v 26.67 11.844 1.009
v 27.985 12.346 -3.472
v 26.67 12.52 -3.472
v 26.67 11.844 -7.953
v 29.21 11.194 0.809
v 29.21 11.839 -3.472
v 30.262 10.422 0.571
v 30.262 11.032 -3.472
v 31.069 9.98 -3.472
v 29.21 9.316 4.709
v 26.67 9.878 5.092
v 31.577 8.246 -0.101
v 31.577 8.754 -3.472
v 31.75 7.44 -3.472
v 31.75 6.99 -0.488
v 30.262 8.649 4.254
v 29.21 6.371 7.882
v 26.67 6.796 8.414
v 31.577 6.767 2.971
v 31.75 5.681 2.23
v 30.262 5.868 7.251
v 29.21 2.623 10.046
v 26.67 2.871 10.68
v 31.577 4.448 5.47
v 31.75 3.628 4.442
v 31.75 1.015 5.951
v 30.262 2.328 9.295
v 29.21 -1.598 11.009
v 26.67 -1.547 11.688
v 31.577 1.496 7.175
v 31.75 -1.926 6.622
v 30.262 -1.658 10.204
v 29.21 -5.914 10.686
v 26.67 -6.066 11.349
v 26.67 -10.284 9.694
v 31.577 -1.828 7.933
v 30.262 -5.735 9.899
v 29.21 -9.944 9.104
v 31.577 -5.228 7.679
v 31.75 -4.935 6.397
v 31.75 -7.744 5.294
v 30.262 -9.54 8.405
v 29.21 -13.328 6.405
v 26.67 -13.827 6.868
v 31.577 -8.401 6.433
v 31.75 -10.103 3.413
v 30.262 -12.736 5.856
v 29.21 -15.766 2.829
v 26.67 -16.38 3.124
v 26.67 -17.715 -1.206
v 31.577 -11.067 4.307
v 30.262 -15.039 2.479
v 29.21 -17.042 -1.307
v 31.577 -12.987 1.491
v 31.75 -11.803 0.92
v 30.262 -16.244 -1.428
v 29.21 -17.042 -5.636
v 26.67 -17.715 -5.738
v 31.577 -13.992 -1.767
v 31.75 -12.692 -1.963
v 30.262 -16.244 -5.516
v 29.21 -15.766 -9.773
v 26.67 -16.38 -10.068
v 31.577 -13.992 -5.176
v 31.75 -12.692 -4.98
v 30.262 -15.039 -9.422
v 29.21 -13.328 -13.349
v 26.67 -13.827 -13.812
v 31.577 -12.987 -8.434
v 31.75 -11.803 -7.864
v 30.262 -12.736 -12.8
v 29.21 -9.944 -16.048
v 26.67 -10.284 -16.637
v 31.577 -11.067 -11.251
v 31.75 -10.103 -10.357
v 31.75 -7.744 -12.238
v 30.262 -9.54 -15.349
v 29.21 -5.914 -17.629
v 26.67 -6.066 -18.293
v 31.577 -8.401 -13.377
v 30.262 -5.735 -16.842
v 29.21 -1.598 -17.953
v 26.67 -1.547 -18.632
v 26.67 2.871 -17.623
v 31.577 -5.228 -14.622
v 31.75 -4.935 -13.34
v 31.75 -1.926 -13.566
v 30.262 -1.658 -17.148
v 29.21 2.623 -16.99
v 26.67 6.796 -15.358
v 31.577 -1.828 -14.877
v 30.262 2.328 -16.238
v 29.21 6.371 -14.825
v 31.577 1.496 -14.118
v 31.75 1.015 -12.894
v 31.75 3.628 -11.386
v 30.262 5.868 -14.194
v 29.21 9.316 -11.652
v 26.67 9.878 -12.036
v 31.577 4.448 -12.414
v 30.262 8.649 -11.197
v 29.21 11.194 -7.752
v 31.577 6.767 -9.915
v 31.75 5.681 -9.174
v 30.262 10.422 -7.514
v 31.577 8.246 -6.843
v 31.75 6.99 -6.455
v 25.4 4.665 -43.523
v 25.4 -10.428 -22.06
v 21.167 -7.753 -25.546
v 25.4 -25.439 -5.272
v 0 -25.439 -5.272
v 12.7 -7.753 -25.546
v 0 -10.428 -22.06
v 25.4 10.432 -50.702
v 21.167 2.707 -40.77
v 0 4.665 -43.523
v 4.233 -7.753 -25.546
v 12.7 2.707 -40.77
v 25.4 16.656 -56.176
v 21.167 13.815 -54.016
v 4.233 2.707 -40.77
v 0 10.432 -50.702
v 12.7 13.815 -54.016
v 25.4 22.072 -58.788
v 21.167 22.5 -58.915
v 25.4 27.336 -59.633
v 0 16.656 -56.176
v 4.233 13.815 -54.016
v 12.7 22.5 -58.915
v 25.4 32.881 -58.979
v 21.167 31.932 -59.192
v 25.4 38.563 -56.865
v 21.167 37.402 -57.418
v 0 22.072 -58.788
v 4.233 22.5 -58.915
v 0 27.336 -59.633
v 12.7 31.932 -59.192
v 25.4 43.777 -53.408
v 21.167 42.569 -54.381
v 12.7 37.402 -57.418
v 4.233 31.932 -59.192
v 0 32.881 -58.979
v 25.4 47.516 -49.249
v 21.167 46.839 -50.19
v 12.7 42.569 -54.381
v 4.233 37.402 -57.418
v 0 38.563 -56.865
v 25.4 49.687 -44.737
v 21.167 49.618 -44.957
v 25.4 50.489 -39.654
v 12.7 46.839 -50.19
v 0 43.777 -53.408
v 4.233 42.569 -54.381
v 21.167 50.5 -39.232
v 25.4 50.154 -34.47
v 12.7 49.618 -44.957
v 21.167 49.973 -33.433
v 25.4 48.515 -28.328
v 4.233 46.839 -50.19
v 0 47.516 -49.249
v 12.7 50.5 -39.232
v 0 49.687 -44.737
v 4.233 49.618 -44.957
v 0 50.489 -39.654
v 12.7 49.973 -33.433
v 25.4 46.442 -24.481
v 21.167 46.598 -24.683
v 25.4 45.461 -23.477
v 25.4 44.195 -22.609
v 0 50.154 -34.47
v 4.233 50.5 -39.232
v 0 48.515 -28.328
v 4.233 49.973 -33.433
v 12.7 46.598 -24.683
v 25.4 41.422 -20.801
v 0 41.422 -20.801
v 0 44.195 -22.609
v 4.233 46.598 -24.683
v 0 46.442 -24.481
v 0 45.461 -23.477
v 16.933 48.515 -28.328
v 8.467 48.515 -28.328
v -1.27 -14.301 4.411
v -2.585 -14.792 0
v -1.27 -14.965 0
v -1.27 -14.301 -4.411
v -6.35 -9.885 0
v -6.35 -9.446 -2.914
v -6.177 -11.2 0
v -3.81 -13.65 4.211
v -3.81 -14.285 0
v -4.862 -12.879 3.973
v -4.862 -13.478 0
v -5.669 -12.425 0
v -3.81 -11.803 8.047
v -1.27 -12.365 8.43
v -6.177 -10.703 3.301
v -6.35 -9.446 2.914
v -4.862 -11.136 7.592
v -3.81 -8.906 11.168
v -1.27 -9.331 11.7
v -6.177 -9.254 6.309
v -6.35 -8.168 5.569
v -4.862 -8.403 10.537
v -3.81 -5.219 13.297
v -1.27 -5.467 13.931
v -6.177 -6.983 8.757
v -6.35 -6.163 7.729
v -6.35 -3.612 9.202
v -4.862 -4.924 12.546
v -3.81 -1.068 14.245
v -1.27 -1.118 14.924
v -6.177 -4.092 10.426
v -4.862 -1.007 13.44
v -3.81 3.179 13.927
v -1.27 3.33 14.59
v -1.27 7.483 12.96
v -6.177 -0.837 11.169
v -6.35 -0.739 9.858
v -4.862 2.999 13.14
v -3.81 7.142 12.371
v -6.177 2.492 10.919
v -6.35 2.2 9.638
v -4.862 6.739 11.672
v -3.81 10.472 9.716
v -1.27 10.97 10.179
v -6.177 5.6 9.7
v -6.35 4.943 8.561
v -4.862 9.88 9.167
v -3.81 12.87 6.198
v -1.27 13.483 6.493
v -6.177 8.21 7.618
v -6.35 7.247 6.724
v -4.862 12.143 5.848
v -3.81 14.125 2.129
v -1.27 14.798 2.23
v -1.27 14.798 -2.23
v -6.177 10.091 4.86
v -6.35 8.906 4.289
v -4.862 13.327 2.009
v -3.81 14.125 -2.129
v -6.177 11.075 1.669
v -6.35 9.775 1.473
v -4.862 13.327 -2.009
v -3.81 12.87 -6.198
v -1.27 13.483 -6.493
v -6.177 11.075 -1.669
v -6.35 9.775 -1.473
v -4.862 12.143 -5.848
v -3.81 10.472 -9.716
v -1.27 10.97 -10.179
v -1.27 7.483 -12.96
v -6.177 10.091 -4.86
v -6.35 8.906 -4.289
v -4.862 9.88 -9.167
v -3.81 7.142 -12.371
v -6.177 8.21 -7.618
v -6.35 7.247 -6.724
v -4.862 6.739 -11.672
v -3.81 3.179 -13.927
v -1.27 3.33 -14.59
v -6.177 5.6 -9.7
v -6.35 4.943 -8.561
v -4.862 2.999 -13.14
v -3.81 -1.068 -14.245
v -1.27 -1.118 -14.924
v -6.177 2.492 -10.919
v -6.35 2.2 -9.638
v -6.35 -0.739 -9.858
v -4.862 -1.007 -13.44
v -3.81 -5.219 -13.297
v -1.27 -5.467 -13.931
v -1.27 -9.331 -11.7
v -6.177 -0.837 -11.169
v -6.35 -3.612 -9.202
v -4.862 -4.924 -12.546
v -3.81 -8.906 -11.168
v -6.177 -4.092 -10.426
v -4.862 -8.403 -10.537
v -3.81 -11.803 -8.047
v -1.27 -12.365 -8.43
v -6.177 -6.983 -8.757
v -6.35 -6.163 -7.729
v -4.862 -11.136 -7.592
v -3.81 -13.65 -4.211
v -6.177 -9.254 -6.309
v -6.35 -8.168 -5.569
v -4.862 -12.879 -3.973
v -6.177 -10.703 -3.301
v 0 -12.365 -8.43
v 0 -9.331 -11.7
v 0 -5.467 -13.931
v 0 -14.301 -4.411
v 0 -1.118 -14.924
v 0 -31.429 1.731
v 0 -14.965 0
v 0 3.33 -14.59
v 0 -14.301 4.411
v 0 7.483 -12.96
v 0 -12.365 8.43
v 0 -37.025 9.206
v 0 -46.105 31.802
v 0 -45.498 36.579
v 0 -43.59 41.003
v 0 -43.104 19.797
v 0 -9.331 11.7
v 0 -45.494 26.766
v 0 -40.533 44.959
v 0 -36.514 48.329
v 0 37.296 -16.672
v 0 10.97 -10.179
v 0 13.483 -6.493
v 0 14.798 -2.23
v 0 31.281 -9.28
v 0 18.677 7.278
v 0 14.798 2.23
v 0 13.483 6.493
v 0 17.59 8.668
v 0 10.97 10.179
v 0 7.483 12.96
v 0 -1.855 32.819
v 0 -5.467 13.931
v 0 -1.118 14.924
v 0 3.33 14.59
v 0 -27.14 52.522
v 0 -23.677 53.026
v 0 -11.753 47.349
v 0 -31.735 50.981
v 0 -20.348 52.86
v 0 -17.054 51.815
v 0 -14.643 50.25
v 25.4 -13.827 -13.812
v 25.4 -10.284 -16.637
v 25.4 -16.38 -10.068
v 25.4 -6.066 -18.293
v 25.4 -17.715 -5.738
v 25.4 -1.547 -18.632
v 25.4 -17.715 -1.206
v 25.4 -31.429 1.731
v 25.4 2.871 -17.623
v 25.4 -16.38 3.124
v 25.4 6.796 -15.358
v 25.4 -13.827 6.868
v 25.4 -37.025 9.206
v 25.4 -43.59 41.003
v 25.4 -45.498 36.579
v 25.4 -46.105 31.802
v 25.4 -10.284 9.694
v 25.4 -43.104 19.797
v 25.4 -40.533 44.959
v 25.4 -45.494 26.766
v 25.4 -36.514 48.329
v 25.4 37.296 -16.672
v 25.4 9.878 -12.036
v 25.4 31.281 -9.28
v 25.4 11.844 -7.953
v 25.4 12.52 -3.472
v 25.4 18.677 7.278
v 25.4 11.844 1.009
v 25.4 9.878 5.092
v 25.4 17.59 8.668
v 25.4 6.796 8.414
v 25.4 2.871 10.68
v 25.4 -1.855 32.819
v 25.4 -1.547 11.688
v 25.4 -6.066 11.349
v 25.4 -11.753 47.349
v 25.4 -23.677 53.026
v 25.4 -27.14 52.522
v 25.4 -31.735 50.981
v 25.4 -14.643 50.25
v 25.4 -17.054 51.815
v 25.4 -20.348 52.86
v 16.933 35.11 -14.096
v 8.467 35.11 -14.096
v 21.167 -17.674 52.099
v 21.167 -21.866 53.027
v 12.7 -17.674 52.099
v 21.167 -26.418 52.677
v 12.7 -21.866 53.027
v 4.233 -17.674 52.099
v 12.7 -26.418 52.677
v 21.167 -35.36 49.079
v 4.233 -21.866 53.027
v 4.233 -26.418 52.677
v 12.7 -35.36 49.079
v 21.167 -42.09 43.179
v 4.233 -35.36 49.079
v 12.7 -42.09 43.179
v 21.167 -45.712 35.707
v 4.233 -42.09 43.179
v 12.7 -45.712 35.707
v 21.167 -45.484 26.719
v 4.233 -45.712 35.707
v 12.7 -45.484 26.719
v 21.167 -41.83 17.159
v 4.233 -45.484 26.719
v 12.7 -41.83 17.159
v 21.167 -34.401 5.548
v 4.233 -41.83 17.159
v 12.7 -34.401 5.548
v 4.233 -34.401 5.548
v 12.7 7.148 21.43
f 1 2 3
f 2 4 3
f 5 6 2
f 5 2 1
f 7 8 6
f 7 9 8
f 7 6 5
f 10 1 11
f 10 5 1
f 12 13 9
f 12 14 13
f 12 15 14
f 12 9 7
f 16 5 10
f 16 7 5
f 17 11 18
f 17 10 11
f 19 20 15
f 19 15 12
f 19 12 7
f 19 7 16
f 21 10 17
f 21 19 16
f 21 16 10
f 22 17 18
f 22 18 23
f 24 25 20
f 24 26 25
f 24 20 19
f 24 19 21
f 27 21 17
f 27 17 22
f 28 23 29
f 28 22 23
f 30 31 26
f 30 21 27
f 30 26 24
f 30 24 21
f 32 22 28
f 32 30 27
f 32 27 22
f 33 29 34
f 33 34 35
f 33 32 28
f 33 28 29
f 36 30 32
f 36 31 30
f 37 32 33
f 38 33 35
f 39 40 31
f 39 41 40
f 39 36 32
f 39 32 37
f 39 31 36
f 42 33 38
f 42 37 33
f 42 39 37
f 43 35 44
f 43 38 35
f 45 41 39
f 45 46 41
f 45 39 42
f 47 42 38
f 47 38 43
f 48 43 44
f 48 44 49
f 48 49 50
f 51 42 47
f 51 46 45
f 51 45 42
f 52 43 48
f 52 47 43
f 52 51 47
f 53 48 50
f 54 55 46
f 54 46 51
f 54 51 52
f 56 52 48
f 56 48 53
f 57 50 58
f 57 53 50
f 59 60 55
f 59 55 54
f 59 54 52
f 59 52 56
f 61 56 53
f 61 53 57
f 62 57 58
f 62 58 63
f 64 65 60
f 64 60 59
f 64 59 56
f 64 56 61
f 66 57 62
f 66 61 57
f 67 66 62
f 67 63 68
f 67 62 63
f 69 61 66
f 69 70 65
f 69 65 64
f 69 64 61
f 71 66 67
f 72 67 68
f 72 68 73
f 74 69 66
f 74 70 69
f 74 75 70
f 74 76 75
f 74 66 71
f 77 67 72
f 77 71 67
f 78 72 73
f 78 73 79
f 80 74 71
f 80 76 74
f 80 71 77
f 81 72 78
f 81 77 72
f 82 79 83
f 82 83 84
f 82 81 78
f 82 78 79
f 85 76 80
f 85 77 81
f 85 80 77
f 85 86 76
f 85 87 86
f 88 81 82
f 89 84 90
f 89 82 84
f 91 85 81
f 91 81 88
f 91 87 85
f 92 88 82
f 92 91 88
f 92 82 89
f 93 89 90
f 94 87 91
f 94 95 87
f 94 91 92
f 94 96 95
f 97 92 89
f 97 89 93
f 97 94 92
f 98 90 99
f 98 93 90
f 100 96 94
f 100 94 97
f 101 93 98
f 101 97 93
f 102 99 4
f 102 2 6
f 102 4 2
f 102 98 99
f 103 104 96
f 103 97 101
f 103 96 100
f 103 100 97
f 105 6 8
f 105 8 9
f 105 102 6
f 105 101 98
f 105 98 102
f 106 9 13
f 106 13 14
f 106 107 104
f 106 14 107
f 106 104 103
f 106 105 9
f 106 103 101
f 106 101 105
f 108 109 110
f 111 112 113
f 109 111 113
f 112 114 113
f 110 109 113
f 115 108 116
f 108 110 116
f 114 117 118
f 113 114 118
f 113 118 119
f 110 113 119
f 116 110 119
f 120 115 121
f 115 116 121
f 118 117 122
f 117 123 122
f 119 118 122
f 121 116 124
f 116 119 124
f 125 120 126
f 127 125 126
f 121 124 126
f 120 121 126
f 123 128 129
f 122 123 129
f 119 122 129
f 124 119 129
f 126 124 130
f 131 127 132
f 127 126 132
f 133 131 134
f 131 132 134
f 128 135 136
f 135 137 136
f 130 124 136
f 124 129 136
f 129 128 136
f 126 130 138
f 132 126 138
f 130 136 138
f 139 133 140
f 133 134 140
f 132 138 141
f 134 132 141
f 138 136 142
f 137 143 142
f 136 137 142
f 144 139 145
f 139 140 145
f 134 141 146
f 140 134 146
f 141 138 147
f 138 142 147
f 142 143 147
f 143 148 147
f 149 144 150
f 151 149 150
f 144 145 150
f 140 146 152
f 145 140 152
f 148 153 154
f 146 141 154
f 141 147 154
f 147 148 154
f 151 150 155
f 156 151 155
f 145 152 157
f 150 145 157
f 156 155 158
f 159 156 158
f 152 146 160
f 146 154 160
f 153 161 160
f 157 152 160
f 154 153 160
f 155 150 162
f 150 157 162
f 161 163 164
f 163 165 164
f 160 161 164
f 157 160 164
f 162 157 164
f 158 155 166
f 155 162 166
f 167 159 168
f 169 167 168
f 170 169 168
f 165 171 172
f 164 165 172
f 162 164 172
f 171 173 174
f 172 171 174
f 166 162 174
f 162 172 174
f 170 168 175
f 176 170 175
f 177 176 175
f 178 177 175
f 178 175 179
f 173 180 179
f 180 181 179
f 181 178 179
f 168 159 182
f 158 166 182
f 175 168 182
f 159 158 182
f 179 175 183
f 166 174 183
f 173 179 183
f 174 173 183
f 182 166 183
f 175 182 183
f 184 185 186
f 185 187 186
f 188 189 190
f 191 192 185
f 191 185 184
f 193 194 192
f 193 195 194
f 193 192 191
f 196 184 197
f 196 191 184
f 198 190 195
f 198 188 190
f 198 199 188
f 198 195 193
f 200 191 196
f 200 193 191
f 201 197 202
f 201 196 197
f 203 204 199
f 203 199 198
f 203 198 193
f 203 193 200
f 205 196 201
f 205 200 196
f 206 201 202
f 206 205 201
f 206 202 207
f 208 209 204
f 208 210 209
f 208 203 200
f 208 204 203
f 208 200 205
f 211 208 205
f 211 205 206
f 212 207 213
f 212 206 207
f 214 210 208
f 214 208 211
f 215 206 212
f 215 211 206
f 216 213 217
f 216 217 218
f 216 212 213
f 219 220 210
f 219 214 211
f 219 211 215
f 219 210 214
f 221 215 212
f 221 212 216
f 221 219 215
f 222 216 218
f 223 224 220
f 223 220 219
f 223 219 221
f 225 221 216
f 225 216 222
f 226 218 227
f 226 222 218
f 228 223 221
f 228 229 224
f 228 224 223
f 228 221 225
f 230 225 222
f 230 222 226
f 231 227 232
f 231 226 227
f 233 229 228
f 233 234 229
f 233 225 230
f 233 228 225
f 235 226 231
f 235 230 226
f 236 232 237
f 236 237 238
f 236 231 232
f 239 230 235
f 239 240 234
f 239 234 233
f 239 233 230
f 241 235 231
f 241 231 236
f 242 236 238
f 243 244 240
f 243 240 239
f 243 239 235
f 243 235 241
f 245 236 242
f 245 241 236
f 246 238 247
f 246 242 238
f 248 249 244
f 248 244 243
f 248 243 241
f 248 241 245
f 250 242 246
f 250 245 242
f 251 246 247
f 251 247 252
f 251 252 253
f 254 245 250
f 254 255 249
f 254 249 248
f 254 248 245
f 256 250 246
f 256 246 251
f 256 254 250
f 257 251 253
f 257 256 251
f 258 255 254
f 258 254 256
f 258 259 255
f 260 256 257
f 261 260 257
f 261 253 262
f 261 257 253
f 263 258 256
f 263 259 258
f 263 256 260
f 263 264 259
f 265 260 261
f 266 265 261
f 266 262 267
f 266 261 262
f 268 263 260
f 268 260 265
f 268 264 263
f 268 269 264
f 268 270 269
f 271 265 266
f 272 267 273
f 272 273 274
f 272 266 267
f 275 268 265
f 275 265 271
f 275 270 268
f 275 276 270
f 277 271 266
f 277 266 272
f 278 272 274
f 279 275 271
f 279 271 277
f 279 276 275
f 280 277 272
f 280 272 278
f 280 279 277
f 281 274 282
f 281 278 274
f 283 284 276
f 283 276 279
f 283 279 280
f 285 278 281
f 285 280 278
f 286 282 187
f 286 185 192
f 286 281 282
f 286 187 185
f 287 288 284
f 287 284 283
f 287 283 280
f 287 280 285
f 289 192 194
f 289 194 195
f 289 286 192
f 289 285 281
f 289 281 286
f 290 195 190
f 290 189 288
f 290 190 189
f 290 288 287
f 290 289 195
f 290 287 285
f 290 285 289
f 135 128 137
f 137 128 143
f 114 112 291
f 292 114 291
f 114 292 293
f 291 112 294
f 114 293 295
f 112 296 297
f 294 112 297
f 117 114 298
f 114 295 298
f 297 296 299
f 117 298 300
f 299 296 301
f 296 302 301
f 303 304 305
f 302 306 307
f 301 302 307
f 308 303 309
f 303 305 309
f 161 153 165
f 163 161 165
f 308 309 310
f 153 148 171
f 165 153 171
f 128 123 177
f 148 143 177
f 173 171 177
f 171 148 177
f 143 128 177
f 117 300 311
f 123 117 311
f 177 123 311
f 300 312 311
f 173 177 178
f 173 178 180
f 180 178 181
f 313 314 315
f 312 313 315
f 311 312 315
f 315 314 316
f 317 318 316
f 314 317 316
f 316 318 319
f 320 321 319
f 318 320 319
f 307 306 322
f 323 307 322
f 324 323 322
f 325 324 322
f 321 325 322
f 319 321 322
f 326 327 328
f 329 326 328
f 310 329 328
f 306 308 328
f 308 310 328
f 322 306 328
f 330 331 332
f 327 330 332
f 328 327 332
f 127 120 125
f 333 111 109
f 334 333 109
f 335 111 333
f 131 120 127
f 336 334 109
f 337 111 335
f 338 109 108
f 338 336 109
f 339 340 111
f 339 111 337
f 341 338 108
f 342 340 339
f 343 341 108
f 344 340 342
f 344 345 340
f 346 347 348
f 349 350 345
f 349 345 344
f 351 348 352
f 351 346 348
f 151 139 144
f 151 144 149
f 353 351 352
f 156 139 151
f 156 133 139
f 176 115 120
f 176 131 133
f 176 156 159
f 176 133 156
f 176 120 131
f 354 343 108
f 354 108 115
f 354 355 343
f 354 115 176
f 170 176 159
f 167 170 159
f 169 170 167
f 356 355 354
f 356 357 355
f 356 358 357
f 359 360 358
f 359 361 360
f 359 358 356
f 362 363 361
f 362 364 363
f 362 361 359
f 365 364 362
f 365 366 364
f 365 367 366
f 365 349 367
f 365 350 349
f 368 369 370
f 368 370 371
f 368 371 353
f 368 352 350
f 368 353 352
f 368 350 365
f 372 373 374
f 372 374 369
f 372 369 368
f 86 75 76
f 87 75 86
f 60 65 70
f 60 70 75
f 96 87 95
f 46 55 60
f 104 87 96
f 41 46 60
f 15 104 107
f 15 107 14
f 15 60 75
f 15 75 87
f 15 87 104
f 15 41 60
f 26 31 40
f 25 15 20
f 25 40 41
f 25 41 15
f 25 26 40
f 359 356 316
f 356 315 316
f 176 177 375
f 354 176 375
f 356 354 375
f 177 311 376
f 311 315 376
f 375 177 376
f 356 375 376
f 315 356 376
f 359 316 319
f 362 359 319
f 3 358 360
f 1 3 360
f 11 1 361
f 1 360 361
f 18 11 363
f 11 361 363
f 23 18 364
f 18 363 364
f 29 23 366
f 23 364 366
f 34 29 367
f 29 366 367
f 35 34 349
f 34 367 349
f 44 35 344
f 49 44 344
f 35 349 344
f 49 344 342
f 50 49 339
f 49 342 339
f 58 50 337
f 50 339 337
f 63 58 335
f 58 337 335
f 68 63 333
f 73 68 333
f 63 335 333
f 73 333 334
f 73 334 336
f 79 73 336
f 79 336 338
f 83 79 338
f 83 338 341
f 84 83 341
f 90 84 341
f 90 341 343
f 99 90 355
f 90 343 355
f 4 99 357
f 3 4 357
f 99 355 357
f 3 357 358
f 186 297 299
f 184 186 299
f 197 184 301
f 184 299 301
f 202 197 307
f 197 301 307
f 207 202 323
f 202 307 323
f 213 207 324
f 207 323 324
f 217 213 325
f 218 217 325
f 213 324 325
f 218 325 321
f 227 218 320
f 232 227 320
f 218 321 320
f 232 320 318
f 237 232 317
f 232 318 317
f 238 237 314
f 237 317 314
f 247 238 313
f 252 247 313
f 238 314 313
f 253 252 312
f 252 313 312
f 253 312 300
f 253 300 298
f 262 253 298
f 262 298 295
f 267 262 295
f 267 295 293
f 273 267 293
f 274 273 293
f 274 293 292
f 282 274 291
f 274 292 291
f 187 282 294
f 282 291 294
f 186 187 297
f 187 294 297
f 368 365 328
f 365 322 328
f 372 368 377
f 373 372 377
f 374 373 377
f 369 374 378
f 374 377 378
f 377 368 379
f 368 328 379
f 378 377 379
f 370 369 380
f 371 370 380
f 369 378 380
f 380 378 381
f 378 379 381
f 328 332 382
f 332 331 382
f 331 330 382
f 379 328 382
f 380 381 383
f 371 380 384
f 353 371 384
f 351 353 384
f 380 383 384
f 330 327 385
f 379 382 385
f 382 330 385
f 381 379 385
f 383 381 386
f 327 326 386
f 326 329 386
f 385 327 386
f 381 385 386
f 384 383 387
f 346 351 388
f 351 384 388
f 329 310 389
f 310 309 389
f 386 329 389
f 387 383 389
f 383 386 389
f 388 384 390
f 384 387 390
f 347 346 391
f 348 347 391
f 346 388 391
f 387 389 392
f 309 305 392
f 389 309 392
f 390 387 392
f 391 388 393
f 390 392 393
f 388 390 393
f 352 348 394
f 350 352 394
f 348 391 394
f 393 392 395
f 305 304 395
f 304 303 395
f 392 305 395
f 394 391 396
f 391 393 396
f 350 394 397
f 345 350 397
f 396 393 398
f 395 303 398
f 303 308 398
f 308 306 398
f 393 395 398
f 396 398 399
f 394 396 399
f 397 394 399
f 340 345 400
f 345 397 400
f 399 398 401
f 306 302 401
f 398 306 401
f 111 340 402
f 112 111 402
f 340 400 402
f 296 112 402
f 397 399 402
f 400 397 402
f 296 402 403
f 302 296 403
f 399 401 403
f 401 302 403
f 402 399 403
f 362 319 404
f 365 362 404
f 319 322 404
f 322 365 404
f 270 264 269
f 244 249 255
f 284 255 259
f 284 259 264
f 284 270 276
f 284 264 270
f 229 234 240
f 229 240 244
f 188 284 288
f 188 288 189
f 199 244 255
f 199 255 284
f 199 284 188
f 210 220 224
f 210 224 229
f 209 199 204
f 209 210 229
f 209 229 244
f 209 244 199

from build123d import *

# Parameters (mm, degrees)
F1_DEPTH = 25.4
F2_R     = 15.2023379057
F3_DEPTH = 6.35
F4_R     = 5.08
F5_R     = 14.9654101867
F6_DEPTH = 6.35
F7_R     = 5.08


with BuildPart() as f1:
    # F0 (on Right) → F1 (new body)
    with BuildSketch(Plane.YZ):
        with BuildLine():
            add(Edge.make_bspline(
                [(17.5895973285, 8.6684559332), (12.926883986, 14.595669488), (8.5494174917, 19.6884086013), (4.5840121801, 24.5384006165)],
                knots=[0.0995191246, 0.0995191246, 0.0995191246, 0.0995191246, 0.152721543, 0.152721543, 0.152721543, 0.152721543], degree=3))
            add(Edge.make_bspline(
                [(4.5840121801, 24.5384006165), (-2.6449352498, 24.2912825538), (-16.1555832179, 23.8277360507), (-20.8656688407, 7.9987518659), (-26.1889236954, 0.4550080745), (-25.6655710399, -3.5394503148), (-25.4385583103, -5.2721607499)],
                knots=[0, 0, 0, 0, 0.3250640996, 0.6074597615, 0.8297202417, 1, 1, 1, 1], degree=3))
            add(Edge.make_bspline(
                [(-25.4385583103, -5.2721607499), (-19.4594130533, -11.9211098705), (-7.0275398922, -23.92143448), (11.2285332479, -56.499011327), (31.8657157041, -62.3988290991), (54.7809349484, -47.6982303514), (47.7318843456, -22.8967932655), (43.6377429171, -22.5775247161), (41.4221696556, -20.8011046052)],
                knots=[0.5588461474, 0.5588461474, 0.5588461474, 0.5588461474, 0.6425413931, 0.7389755952, 0.8090175152, 0.8859010502, 0.9589551189, 1, 1, 1, 1], degree=3))
            add(Edge.make_bspline(
                [(41.4221696556, -20.8011046052), (36.2724600651, -16.6721291203), (27.1098664748, -3.5665562843), (18.677022654, 7.2778597007)],
                knots=[0, 0, 0, 0, 0.0954015927, 0.0954015927, 0.0954015927, 0.0954015927], degree=3))
            add(Edge.make_bspline(
                [(18.677022654, 7.2778597007), (20.5479403218, 4.5193017031), (22.7185021169, -2.2242411706), (20.9560532942, -4.5004371737), (20.4507708549, -5.8810990304)],
                knots=[0.855051074, 0.855051074, 0.855051074, 0.855051074, 0.9432583461, 1, 1, 1, 1], degree=3))
            add(Edge.make_bspline(
                [(20.4507708549, -5.8810990304), (19.7334866596, -7.8410462834), (18.9363412125, -14.6456595882), (6.7083467506, -23.7841967524), (-6.5196901774, -21.2806184823), (-14.2159187864, -13.5782446445), (-18.6143428061, -2.5133707137), (-11.6738903391, 8.7514405367), (-3.167673086, 18.2061044328), (10.8069775822, 13.3883321592), (15.9377118907, 10.4988793955), (17.5895973285, 8.6684559332)],
                knots=[0, 0, 0, 0, 0.0805487948, 0.1860104875, 0.2852583123, 0.3766701629, 0.4688855974, 0.5686999528, 0.6641075306, 0.7690941368, 0.8388777749, 0.8388777749, 0.8388777749, 0.8388777749], degree=3))
        make_face()
        with BuildLine():
            add(Edge.make_bspline(
                [(4.5840121801, 24.5384006165), (-2.6449352498, 24.2912825538), (-16.1555832179, 23.8277360507), (-20.8656688407, 7.9987518659), (-26.1889236954, 0.4550080745), (-25.6655710399, -3.5394503148), (-25.4385583103, -5.2721607499)],
                knots=[0, 0, 0, 0, 0.3250640996, 0.6074597615, 0.8297202417, 1, 1, 1, 1], degree=3))
            add(Edge.make_bspline(
                [(4.5840121801, 24.5384006165), (1.495955059, 28.3153291277), (-6.4591174842, 38.4890393217), (-15.2300614855, 56.3009606306), (-36.68626185, 50.668932912), (-48.6411700722, 36.077924192), (-42.9908909127, 15.8445771028), (-31.5144702266, 1.4843951551), (-25.4385583103, -5.2721607499)],
                knots=[0.152721543, 0.152721543, 0.152721543, 0.152721543, 0.1941528958, 0.2688492969, 0.337197153, 0.4035534252, 0.4737963753, 0.5588461474, 0.5588461474, 0.5588461474, 0.5588461474], degree=3))
        make_face()
        with BuildLine():
            add(Edge.make_bspline(
                [(18.677022654, 7.2778597007), (18.3492834329, 7.6993237434), (17.9865460441, 8.1635757898), (17.6255113718, 8.6228022143), (17.5895973285, 8.6684559332)],
                knots=[0.0954015927, 0.0954015927, 0.0954015927, 0.0954015927, 0.0991093388, 0.0995191246, 0.0995191246, 0.0995191246, 0.0995191246], degree=3))
            add(Edge.make_bspline(
                [(20.4507708549, -5.8810990304), (19.7334866596, -7.8410462834), (18.9363412125, -14.6456595882), (6.7083467506, -23.7841967524), (-6.5196901774, -21.2806184823), (-14.2159187864, -13.5782446445), (-18.6143428061, -2.5133707137), (-11.6738903391, 8.7514405367), (-3.167673086, 18.2061044328), (10.8069775822, 13.3883321592), (15.9377118907, 10.4988793955), (17.5895973285, 8.6684559332)],
                knots=[0, 0, 0, 0, 0.0805487948, 0.1860104875, 0.2852583123, 0.3766701629, 0.4688855974, 0.5686999528, 0.6641075306, 0.7690941368, 0.8388777749, 0.8388777749, 0.8388777749, 0.8388777749], degree=3))
            add(Edge.make_bspline(
                [(18.677022654, 7.2778597007), (20.5479403218, 4.5193017031), (22.7185021169, -2.2242411706), (20.9560532942, -4.5004371737), (20.4507708549, -5.8810990304)],
                knots=[0.855051074, 0.855051074, 0.855051074, 0.855051074, 0.9432583461, 1, 1, 1, 1], degree=3))
        make_face()
    extrude(amount=F1_DEPTH)

    # F2 (on face) → F3 (join)
    with BuildSketch(Plane.YZ.offset(25.4)):
        with Locations((-2.6827834081, -3.4718343522)):
            Circle(F2_R)
    extrude(amount=F3_DEPTH)

    # F4
    f4_edges = [f1.edges().sort_by_distance(p)[0] for p in [
        (31.75, -17.885121, -3.471834),
    ]]
    fillet(f4_edges, radius=F4_R)

    # F5 (on face) → F6 (join)
    with BuildSketch(Plane(origin=(0, 0, 0), x_dir=(0, -1, 0), z_dir=(-1, 0, 0))):
        Circle(F5_R)
    extrude(amount=F6_DEPTH)

    # F7
    f7_edges = [f1.edges().sort_by_distance(p)[0] for p in [
        (-6.35, 14.96541, 0),
    ]]
    fillet(f7_edges, radius=F7_R)


solid = f1.part
